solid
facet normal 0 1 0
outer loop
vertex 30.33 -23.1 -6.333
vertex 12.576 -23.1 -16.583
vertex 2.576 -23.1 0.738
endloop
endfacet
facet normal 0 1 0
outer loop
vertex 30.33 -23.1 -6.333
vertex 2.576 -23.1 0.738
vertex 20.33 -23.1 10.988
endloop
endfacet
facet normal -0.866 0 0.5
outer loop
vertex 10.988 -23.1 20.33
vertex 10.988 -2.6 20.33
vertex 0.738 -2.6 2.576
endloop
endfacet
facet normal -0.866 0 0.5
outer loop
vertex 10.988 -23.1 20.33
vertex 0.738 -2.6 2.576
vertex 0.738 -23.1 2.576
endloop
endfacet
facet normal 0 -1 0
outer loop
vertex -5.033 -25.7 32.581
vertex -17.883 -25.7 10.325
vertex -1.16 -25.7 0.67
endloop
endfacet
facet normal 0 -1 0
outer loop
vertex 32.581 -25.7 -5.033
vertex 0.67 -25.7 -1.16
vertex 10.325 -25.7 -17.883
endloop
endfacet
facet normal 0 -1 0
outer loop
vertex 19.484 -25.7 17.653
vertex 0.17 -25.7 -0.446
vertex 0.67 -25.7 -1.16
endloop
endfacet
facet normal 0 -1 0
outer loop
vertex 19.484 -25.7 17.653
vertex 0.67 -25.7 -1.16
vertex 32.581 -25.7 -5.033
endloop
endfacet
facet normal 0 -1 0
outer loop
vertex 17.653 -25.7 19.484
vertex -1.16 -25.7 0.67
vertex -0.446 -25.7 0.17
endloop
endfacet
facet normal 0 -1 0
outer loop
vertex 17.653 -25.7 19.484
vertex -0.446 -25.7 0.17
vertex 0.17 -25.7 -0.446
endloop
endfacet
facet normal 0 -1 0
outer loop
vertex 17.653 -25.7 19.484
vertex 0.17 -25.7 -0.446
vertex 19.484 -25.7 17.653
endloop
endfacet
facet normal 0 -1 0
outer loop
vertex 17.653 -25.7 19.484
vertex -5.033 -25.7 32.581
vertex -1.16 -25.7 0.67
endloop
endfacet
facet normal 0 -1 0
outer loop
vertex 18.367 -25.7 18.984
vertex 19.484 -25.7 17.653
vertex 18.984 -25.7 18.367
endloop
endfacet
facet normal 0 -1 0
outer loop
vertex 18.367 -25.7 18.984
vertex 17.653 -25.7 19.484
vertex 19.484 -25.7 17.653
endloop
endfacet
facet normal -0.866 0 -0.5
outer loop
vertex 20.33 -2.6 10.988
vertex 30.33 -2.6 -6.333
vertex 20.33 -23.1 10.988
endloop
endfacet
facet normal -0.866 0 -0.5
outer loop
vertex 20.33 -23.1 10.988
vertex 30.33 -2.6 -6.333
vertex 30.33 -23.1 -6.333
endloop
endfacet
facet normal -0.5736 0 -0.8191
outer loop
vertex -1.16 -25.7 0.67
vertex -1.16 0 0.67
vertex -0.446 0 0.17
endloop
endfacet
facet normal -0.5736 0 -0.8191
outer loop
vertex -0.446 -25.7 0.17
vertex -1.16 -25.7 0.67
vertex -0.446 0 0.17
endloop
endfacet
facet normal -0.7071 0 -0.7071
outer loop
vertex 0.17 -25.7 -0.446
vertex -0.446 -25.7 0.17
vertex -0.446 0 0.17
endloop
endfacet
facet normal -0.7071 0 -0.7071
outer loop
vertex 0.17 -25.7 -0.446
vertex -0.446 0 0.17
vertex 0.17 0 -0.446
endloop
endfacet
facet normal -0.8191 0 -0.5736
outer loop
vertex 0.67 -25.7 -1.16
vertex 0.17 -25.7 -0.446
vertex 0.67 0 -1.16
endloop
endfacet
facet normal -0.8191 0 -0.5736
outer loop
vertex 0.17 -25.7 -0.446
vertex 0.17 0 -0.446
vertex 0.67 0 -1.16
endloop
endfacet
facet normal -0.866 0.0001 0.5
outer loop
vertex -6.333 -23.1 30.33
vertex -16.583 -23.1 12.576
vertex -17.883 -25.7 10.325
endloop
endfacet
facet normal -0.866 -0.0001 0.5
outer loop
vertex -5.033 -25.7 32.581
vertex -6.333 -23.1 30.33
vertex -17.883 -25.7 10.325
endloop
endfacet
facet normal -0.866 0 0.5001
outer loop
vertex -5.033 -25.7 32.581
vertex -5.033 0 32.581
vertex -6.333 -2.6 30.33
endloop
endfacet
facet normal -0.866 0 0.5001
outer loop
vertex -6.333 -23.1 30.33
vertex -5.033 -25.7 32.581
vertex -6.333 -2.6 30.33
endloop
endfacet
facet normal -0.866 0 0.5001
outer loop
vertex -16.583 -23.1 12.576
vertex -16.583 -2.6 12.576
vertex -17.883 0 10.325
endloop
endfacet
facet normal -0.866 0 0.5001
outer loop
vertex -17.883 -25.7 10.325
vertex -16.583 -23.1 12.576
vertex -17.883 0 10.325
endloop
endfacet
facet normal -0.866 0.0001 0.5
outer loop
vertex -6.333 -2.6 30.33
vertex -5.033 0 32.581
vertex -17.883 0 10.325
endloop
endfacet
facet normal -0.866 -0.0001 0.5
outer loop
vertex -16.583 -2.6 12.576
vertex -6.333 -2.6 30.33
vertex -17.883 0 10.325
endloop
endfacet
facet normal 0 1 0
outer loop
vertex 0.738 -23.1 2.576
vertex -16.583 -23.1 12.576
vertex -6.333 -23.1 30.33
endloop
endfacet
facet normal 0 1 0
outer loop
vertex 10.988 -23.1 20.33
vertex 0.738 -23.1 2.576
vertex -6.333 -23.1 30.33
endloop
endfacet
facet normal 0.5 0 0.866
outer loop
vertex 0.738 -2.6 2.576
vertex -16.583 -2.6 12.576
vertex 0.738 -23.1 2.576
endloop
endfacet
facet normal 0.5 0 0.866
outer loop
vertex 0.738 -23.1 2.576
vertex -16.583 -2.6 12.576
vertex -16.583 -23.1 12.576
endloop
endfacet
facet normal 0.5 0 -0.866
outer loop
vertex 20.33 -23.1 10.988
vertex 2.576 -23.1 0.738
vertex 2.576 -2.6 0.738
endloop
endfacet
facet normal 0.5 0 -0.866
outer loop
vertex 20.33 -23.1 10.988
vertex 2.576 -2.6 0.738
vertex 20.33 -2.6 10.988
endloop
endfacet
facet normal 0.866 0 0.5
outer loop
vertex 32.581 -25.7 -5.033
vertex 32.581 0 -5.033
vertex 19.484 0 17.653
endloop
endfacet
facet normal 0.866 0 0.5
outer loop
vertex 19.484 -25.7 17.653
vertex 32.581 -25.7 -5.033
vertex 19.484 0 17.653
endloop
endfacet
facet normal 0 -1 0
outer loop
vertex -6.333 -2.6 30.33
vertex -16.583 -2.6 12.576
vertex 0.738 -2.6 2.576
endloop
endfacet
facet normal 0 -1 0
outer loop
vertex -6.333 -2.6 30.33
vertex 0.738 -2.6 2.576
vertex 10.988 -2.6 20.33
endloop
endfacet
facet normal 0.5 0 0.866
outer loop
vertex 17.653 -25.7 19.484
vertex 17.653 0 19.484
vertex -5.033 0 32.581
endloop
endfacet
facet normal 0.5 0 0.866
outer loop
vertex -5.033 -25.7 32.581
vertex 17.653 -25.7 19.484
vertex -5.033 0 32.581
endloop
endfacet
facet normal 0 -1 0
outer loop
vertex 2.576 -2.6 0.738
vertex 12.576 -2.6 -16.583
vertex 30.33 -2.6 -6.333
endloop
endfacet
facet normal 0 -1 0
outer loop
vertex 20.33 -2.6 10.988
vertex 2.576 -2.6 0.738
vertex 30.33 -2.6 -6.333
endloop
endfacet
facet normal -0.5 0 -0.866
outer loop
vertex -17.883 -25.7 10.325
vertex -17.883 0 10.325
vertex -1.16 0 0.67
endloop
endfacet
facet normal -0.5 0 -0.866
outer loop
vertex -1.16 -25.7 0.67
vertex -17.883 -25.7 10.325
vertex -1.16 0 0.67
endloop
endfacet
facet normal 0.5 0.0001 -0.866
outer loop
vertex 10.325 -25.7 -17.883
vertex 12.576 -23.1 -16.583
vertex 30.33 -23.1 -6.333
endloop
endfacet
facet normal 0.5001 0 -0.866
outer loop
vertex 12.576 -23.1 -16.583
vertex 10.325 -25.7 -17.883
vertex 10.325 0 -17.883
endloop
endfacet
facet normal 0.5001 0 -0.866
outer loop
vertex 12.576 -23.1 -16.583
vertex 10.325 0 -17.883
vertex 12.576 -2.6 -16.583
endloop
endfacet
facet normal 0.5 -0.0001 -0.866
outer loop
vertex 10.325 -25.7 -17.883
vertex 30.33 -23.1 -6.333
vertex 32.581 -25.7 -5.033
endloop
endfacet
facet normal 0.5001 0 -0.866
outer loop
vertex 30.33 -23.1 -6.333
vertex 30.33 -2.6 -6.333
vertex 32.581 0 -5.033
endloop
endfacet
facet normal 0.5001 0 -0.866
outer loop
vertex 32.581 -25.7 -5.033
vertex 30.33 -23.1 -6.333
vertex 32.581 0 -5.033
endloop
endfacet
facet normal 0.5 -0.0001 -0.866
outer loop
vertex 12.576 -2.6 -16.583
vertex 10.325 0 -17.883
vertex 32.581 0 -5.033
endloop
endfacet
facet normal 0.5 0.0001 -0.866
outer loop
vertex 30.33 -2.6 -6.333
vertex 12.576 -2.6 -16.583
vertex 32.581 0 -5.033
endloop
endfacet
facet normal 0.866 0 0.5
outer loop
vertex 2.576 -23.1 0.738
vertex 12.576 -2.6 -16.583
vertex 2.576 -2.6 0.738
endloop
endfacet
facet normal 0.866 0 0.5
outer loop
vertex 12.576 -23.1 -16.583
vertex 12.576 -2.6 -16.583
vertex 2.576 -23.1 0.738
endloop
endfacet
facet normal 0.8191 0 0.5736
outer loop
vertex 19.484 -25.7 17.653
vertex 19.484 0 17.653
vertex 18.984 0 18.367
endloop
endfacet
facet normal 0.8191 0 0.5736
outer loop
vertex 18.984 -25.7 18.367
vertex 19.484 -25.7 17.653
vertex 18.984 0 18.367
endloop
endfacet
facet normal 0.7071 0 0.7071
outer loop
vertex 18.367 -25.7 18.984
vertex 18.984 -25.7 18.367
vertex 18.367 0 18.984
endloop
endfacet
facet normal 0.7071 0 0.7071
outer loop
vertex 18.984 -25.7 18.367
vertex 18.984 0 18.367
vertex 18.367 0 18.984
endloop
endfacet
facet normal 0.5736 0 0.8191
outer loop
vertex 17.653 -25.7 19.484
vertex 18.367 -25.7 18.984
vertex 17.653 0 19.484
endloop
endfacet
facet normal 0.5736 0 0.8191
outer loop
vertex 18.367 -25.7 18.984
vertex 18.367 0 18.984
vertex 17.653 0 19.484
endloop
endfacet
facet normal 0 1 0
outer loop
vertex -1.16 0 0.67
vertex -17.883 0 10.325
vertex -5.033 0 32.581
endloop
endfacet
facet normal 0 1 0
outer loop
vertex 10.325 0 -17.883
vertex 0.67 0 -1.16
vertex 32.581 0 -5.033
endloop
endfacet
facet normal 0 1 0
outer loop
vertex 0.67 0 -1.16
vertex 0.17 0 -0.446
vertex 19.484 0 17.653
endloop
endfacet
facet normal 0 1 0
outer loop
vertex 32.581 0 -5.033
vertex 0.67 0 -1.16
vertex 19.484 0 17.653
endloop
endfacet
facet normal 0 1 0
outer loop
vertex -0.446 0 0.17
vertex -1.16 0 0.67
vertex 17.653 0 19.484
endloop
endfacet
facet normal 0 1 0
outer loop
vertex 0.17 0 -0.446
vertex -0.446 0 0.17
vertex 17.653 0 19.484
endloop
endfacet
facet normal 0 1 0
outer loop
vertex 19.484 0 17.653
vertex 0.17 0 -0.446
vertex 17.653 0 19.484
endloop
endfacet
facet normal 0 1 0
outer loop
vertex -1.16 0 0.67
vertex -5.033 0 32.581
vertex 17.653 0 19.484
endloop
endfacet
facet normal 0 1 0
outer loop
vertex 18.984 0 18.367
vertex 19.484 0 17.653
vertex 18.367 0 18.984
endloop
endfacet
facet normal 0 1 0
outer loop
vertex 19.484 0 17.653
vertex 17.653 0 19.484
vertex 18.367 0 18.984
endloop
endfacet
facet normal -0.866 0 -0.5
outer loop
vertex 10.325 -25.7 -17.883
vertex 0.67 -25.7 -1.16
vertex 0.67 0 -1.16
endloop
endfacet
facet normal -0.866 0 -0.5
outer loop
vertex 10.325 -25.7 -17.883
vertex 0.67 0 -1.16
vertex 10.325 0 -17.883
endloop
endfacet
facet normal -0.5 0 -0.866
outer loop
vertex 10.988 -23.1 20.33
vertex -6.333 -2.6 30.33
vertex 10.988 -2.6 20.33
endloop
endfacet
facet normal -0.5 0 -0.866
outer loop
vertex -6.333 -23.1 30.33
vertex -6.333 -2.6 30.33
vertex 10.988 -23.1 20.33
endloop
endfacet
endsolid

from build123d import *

# Parameters (mm, degrees)
F1_DEPTH = 25.7
F2_W     = 20.5
F2_H     = 20.5
F3_DEPTH = 20
F4_W     = 20.5
F4_H     = 20.5
F5_DEPTH = 20


with BuildPart() as f1:
    # F0 (on Front) → F1 (new body)
    with BuildSketch(Plane.XZ):
        with BuildLine():
            Line((0.6698729811, -1.1602540378), (10.3245955671, -17.8827240898))
            Line((10.3245955671, -17.8827240898), (32.5814484444, -5.0327240898))
            Line((32.5814484444, -5.0327240898), (19.4835787356, 17.6534517167))
            ThreePointArc((19.4835787356, 17.6534517167), (18.6889856226, 18.6889856226), (17.6534517167, 19.4835787356))
            Line((17.6534517167, 19.4835787356), (-5.0327240898, 32.5814484444))
            Line((-5.0327240898, 32.5814484444), (-17.8827240898, 10.3245955671))
            Line((-17.8827240898, 10.3245955671), (-1.1602540378, 0.6698729811))
            ThreePointArc((-1.1602540378, 0.6698729811), (-0.1247201319, -0.1247201319), (0.6698729811, -1.1602540378))
        make_face()
    extrude(amount=F1_DEPTH)

    # F2 (on face) → F3 (cut)
    with BuildSketch(Plane(origin=(-17.8827240898, 0, 10.3245955671), x_dir=(0, -1, 0), z_dir=(-0.8660254038, 0, 0.5))):
        with Locations((12.85, 12.85)):
            Rectangle(F2_W, F2_H)
    extrude(amount=-F3_DEPTH, mode=Mode.SUBTRACT)

    # F4 (on face) → F5 (cut)
    with BuildSketch(Plane(origin=(10.3245955671, 0, -17.8827240898), x_dir=(0.8660254038, 0, 0.5), z_dir=(0.5, 0, -0.8660254038))):
        with Locations((12.85, 12.85)):
            Rectangle(F4_W, F4_H)
    extrude(amount=-F5_DEPTH, mode=Mode.SUBTRACT)


solid = f1.part
